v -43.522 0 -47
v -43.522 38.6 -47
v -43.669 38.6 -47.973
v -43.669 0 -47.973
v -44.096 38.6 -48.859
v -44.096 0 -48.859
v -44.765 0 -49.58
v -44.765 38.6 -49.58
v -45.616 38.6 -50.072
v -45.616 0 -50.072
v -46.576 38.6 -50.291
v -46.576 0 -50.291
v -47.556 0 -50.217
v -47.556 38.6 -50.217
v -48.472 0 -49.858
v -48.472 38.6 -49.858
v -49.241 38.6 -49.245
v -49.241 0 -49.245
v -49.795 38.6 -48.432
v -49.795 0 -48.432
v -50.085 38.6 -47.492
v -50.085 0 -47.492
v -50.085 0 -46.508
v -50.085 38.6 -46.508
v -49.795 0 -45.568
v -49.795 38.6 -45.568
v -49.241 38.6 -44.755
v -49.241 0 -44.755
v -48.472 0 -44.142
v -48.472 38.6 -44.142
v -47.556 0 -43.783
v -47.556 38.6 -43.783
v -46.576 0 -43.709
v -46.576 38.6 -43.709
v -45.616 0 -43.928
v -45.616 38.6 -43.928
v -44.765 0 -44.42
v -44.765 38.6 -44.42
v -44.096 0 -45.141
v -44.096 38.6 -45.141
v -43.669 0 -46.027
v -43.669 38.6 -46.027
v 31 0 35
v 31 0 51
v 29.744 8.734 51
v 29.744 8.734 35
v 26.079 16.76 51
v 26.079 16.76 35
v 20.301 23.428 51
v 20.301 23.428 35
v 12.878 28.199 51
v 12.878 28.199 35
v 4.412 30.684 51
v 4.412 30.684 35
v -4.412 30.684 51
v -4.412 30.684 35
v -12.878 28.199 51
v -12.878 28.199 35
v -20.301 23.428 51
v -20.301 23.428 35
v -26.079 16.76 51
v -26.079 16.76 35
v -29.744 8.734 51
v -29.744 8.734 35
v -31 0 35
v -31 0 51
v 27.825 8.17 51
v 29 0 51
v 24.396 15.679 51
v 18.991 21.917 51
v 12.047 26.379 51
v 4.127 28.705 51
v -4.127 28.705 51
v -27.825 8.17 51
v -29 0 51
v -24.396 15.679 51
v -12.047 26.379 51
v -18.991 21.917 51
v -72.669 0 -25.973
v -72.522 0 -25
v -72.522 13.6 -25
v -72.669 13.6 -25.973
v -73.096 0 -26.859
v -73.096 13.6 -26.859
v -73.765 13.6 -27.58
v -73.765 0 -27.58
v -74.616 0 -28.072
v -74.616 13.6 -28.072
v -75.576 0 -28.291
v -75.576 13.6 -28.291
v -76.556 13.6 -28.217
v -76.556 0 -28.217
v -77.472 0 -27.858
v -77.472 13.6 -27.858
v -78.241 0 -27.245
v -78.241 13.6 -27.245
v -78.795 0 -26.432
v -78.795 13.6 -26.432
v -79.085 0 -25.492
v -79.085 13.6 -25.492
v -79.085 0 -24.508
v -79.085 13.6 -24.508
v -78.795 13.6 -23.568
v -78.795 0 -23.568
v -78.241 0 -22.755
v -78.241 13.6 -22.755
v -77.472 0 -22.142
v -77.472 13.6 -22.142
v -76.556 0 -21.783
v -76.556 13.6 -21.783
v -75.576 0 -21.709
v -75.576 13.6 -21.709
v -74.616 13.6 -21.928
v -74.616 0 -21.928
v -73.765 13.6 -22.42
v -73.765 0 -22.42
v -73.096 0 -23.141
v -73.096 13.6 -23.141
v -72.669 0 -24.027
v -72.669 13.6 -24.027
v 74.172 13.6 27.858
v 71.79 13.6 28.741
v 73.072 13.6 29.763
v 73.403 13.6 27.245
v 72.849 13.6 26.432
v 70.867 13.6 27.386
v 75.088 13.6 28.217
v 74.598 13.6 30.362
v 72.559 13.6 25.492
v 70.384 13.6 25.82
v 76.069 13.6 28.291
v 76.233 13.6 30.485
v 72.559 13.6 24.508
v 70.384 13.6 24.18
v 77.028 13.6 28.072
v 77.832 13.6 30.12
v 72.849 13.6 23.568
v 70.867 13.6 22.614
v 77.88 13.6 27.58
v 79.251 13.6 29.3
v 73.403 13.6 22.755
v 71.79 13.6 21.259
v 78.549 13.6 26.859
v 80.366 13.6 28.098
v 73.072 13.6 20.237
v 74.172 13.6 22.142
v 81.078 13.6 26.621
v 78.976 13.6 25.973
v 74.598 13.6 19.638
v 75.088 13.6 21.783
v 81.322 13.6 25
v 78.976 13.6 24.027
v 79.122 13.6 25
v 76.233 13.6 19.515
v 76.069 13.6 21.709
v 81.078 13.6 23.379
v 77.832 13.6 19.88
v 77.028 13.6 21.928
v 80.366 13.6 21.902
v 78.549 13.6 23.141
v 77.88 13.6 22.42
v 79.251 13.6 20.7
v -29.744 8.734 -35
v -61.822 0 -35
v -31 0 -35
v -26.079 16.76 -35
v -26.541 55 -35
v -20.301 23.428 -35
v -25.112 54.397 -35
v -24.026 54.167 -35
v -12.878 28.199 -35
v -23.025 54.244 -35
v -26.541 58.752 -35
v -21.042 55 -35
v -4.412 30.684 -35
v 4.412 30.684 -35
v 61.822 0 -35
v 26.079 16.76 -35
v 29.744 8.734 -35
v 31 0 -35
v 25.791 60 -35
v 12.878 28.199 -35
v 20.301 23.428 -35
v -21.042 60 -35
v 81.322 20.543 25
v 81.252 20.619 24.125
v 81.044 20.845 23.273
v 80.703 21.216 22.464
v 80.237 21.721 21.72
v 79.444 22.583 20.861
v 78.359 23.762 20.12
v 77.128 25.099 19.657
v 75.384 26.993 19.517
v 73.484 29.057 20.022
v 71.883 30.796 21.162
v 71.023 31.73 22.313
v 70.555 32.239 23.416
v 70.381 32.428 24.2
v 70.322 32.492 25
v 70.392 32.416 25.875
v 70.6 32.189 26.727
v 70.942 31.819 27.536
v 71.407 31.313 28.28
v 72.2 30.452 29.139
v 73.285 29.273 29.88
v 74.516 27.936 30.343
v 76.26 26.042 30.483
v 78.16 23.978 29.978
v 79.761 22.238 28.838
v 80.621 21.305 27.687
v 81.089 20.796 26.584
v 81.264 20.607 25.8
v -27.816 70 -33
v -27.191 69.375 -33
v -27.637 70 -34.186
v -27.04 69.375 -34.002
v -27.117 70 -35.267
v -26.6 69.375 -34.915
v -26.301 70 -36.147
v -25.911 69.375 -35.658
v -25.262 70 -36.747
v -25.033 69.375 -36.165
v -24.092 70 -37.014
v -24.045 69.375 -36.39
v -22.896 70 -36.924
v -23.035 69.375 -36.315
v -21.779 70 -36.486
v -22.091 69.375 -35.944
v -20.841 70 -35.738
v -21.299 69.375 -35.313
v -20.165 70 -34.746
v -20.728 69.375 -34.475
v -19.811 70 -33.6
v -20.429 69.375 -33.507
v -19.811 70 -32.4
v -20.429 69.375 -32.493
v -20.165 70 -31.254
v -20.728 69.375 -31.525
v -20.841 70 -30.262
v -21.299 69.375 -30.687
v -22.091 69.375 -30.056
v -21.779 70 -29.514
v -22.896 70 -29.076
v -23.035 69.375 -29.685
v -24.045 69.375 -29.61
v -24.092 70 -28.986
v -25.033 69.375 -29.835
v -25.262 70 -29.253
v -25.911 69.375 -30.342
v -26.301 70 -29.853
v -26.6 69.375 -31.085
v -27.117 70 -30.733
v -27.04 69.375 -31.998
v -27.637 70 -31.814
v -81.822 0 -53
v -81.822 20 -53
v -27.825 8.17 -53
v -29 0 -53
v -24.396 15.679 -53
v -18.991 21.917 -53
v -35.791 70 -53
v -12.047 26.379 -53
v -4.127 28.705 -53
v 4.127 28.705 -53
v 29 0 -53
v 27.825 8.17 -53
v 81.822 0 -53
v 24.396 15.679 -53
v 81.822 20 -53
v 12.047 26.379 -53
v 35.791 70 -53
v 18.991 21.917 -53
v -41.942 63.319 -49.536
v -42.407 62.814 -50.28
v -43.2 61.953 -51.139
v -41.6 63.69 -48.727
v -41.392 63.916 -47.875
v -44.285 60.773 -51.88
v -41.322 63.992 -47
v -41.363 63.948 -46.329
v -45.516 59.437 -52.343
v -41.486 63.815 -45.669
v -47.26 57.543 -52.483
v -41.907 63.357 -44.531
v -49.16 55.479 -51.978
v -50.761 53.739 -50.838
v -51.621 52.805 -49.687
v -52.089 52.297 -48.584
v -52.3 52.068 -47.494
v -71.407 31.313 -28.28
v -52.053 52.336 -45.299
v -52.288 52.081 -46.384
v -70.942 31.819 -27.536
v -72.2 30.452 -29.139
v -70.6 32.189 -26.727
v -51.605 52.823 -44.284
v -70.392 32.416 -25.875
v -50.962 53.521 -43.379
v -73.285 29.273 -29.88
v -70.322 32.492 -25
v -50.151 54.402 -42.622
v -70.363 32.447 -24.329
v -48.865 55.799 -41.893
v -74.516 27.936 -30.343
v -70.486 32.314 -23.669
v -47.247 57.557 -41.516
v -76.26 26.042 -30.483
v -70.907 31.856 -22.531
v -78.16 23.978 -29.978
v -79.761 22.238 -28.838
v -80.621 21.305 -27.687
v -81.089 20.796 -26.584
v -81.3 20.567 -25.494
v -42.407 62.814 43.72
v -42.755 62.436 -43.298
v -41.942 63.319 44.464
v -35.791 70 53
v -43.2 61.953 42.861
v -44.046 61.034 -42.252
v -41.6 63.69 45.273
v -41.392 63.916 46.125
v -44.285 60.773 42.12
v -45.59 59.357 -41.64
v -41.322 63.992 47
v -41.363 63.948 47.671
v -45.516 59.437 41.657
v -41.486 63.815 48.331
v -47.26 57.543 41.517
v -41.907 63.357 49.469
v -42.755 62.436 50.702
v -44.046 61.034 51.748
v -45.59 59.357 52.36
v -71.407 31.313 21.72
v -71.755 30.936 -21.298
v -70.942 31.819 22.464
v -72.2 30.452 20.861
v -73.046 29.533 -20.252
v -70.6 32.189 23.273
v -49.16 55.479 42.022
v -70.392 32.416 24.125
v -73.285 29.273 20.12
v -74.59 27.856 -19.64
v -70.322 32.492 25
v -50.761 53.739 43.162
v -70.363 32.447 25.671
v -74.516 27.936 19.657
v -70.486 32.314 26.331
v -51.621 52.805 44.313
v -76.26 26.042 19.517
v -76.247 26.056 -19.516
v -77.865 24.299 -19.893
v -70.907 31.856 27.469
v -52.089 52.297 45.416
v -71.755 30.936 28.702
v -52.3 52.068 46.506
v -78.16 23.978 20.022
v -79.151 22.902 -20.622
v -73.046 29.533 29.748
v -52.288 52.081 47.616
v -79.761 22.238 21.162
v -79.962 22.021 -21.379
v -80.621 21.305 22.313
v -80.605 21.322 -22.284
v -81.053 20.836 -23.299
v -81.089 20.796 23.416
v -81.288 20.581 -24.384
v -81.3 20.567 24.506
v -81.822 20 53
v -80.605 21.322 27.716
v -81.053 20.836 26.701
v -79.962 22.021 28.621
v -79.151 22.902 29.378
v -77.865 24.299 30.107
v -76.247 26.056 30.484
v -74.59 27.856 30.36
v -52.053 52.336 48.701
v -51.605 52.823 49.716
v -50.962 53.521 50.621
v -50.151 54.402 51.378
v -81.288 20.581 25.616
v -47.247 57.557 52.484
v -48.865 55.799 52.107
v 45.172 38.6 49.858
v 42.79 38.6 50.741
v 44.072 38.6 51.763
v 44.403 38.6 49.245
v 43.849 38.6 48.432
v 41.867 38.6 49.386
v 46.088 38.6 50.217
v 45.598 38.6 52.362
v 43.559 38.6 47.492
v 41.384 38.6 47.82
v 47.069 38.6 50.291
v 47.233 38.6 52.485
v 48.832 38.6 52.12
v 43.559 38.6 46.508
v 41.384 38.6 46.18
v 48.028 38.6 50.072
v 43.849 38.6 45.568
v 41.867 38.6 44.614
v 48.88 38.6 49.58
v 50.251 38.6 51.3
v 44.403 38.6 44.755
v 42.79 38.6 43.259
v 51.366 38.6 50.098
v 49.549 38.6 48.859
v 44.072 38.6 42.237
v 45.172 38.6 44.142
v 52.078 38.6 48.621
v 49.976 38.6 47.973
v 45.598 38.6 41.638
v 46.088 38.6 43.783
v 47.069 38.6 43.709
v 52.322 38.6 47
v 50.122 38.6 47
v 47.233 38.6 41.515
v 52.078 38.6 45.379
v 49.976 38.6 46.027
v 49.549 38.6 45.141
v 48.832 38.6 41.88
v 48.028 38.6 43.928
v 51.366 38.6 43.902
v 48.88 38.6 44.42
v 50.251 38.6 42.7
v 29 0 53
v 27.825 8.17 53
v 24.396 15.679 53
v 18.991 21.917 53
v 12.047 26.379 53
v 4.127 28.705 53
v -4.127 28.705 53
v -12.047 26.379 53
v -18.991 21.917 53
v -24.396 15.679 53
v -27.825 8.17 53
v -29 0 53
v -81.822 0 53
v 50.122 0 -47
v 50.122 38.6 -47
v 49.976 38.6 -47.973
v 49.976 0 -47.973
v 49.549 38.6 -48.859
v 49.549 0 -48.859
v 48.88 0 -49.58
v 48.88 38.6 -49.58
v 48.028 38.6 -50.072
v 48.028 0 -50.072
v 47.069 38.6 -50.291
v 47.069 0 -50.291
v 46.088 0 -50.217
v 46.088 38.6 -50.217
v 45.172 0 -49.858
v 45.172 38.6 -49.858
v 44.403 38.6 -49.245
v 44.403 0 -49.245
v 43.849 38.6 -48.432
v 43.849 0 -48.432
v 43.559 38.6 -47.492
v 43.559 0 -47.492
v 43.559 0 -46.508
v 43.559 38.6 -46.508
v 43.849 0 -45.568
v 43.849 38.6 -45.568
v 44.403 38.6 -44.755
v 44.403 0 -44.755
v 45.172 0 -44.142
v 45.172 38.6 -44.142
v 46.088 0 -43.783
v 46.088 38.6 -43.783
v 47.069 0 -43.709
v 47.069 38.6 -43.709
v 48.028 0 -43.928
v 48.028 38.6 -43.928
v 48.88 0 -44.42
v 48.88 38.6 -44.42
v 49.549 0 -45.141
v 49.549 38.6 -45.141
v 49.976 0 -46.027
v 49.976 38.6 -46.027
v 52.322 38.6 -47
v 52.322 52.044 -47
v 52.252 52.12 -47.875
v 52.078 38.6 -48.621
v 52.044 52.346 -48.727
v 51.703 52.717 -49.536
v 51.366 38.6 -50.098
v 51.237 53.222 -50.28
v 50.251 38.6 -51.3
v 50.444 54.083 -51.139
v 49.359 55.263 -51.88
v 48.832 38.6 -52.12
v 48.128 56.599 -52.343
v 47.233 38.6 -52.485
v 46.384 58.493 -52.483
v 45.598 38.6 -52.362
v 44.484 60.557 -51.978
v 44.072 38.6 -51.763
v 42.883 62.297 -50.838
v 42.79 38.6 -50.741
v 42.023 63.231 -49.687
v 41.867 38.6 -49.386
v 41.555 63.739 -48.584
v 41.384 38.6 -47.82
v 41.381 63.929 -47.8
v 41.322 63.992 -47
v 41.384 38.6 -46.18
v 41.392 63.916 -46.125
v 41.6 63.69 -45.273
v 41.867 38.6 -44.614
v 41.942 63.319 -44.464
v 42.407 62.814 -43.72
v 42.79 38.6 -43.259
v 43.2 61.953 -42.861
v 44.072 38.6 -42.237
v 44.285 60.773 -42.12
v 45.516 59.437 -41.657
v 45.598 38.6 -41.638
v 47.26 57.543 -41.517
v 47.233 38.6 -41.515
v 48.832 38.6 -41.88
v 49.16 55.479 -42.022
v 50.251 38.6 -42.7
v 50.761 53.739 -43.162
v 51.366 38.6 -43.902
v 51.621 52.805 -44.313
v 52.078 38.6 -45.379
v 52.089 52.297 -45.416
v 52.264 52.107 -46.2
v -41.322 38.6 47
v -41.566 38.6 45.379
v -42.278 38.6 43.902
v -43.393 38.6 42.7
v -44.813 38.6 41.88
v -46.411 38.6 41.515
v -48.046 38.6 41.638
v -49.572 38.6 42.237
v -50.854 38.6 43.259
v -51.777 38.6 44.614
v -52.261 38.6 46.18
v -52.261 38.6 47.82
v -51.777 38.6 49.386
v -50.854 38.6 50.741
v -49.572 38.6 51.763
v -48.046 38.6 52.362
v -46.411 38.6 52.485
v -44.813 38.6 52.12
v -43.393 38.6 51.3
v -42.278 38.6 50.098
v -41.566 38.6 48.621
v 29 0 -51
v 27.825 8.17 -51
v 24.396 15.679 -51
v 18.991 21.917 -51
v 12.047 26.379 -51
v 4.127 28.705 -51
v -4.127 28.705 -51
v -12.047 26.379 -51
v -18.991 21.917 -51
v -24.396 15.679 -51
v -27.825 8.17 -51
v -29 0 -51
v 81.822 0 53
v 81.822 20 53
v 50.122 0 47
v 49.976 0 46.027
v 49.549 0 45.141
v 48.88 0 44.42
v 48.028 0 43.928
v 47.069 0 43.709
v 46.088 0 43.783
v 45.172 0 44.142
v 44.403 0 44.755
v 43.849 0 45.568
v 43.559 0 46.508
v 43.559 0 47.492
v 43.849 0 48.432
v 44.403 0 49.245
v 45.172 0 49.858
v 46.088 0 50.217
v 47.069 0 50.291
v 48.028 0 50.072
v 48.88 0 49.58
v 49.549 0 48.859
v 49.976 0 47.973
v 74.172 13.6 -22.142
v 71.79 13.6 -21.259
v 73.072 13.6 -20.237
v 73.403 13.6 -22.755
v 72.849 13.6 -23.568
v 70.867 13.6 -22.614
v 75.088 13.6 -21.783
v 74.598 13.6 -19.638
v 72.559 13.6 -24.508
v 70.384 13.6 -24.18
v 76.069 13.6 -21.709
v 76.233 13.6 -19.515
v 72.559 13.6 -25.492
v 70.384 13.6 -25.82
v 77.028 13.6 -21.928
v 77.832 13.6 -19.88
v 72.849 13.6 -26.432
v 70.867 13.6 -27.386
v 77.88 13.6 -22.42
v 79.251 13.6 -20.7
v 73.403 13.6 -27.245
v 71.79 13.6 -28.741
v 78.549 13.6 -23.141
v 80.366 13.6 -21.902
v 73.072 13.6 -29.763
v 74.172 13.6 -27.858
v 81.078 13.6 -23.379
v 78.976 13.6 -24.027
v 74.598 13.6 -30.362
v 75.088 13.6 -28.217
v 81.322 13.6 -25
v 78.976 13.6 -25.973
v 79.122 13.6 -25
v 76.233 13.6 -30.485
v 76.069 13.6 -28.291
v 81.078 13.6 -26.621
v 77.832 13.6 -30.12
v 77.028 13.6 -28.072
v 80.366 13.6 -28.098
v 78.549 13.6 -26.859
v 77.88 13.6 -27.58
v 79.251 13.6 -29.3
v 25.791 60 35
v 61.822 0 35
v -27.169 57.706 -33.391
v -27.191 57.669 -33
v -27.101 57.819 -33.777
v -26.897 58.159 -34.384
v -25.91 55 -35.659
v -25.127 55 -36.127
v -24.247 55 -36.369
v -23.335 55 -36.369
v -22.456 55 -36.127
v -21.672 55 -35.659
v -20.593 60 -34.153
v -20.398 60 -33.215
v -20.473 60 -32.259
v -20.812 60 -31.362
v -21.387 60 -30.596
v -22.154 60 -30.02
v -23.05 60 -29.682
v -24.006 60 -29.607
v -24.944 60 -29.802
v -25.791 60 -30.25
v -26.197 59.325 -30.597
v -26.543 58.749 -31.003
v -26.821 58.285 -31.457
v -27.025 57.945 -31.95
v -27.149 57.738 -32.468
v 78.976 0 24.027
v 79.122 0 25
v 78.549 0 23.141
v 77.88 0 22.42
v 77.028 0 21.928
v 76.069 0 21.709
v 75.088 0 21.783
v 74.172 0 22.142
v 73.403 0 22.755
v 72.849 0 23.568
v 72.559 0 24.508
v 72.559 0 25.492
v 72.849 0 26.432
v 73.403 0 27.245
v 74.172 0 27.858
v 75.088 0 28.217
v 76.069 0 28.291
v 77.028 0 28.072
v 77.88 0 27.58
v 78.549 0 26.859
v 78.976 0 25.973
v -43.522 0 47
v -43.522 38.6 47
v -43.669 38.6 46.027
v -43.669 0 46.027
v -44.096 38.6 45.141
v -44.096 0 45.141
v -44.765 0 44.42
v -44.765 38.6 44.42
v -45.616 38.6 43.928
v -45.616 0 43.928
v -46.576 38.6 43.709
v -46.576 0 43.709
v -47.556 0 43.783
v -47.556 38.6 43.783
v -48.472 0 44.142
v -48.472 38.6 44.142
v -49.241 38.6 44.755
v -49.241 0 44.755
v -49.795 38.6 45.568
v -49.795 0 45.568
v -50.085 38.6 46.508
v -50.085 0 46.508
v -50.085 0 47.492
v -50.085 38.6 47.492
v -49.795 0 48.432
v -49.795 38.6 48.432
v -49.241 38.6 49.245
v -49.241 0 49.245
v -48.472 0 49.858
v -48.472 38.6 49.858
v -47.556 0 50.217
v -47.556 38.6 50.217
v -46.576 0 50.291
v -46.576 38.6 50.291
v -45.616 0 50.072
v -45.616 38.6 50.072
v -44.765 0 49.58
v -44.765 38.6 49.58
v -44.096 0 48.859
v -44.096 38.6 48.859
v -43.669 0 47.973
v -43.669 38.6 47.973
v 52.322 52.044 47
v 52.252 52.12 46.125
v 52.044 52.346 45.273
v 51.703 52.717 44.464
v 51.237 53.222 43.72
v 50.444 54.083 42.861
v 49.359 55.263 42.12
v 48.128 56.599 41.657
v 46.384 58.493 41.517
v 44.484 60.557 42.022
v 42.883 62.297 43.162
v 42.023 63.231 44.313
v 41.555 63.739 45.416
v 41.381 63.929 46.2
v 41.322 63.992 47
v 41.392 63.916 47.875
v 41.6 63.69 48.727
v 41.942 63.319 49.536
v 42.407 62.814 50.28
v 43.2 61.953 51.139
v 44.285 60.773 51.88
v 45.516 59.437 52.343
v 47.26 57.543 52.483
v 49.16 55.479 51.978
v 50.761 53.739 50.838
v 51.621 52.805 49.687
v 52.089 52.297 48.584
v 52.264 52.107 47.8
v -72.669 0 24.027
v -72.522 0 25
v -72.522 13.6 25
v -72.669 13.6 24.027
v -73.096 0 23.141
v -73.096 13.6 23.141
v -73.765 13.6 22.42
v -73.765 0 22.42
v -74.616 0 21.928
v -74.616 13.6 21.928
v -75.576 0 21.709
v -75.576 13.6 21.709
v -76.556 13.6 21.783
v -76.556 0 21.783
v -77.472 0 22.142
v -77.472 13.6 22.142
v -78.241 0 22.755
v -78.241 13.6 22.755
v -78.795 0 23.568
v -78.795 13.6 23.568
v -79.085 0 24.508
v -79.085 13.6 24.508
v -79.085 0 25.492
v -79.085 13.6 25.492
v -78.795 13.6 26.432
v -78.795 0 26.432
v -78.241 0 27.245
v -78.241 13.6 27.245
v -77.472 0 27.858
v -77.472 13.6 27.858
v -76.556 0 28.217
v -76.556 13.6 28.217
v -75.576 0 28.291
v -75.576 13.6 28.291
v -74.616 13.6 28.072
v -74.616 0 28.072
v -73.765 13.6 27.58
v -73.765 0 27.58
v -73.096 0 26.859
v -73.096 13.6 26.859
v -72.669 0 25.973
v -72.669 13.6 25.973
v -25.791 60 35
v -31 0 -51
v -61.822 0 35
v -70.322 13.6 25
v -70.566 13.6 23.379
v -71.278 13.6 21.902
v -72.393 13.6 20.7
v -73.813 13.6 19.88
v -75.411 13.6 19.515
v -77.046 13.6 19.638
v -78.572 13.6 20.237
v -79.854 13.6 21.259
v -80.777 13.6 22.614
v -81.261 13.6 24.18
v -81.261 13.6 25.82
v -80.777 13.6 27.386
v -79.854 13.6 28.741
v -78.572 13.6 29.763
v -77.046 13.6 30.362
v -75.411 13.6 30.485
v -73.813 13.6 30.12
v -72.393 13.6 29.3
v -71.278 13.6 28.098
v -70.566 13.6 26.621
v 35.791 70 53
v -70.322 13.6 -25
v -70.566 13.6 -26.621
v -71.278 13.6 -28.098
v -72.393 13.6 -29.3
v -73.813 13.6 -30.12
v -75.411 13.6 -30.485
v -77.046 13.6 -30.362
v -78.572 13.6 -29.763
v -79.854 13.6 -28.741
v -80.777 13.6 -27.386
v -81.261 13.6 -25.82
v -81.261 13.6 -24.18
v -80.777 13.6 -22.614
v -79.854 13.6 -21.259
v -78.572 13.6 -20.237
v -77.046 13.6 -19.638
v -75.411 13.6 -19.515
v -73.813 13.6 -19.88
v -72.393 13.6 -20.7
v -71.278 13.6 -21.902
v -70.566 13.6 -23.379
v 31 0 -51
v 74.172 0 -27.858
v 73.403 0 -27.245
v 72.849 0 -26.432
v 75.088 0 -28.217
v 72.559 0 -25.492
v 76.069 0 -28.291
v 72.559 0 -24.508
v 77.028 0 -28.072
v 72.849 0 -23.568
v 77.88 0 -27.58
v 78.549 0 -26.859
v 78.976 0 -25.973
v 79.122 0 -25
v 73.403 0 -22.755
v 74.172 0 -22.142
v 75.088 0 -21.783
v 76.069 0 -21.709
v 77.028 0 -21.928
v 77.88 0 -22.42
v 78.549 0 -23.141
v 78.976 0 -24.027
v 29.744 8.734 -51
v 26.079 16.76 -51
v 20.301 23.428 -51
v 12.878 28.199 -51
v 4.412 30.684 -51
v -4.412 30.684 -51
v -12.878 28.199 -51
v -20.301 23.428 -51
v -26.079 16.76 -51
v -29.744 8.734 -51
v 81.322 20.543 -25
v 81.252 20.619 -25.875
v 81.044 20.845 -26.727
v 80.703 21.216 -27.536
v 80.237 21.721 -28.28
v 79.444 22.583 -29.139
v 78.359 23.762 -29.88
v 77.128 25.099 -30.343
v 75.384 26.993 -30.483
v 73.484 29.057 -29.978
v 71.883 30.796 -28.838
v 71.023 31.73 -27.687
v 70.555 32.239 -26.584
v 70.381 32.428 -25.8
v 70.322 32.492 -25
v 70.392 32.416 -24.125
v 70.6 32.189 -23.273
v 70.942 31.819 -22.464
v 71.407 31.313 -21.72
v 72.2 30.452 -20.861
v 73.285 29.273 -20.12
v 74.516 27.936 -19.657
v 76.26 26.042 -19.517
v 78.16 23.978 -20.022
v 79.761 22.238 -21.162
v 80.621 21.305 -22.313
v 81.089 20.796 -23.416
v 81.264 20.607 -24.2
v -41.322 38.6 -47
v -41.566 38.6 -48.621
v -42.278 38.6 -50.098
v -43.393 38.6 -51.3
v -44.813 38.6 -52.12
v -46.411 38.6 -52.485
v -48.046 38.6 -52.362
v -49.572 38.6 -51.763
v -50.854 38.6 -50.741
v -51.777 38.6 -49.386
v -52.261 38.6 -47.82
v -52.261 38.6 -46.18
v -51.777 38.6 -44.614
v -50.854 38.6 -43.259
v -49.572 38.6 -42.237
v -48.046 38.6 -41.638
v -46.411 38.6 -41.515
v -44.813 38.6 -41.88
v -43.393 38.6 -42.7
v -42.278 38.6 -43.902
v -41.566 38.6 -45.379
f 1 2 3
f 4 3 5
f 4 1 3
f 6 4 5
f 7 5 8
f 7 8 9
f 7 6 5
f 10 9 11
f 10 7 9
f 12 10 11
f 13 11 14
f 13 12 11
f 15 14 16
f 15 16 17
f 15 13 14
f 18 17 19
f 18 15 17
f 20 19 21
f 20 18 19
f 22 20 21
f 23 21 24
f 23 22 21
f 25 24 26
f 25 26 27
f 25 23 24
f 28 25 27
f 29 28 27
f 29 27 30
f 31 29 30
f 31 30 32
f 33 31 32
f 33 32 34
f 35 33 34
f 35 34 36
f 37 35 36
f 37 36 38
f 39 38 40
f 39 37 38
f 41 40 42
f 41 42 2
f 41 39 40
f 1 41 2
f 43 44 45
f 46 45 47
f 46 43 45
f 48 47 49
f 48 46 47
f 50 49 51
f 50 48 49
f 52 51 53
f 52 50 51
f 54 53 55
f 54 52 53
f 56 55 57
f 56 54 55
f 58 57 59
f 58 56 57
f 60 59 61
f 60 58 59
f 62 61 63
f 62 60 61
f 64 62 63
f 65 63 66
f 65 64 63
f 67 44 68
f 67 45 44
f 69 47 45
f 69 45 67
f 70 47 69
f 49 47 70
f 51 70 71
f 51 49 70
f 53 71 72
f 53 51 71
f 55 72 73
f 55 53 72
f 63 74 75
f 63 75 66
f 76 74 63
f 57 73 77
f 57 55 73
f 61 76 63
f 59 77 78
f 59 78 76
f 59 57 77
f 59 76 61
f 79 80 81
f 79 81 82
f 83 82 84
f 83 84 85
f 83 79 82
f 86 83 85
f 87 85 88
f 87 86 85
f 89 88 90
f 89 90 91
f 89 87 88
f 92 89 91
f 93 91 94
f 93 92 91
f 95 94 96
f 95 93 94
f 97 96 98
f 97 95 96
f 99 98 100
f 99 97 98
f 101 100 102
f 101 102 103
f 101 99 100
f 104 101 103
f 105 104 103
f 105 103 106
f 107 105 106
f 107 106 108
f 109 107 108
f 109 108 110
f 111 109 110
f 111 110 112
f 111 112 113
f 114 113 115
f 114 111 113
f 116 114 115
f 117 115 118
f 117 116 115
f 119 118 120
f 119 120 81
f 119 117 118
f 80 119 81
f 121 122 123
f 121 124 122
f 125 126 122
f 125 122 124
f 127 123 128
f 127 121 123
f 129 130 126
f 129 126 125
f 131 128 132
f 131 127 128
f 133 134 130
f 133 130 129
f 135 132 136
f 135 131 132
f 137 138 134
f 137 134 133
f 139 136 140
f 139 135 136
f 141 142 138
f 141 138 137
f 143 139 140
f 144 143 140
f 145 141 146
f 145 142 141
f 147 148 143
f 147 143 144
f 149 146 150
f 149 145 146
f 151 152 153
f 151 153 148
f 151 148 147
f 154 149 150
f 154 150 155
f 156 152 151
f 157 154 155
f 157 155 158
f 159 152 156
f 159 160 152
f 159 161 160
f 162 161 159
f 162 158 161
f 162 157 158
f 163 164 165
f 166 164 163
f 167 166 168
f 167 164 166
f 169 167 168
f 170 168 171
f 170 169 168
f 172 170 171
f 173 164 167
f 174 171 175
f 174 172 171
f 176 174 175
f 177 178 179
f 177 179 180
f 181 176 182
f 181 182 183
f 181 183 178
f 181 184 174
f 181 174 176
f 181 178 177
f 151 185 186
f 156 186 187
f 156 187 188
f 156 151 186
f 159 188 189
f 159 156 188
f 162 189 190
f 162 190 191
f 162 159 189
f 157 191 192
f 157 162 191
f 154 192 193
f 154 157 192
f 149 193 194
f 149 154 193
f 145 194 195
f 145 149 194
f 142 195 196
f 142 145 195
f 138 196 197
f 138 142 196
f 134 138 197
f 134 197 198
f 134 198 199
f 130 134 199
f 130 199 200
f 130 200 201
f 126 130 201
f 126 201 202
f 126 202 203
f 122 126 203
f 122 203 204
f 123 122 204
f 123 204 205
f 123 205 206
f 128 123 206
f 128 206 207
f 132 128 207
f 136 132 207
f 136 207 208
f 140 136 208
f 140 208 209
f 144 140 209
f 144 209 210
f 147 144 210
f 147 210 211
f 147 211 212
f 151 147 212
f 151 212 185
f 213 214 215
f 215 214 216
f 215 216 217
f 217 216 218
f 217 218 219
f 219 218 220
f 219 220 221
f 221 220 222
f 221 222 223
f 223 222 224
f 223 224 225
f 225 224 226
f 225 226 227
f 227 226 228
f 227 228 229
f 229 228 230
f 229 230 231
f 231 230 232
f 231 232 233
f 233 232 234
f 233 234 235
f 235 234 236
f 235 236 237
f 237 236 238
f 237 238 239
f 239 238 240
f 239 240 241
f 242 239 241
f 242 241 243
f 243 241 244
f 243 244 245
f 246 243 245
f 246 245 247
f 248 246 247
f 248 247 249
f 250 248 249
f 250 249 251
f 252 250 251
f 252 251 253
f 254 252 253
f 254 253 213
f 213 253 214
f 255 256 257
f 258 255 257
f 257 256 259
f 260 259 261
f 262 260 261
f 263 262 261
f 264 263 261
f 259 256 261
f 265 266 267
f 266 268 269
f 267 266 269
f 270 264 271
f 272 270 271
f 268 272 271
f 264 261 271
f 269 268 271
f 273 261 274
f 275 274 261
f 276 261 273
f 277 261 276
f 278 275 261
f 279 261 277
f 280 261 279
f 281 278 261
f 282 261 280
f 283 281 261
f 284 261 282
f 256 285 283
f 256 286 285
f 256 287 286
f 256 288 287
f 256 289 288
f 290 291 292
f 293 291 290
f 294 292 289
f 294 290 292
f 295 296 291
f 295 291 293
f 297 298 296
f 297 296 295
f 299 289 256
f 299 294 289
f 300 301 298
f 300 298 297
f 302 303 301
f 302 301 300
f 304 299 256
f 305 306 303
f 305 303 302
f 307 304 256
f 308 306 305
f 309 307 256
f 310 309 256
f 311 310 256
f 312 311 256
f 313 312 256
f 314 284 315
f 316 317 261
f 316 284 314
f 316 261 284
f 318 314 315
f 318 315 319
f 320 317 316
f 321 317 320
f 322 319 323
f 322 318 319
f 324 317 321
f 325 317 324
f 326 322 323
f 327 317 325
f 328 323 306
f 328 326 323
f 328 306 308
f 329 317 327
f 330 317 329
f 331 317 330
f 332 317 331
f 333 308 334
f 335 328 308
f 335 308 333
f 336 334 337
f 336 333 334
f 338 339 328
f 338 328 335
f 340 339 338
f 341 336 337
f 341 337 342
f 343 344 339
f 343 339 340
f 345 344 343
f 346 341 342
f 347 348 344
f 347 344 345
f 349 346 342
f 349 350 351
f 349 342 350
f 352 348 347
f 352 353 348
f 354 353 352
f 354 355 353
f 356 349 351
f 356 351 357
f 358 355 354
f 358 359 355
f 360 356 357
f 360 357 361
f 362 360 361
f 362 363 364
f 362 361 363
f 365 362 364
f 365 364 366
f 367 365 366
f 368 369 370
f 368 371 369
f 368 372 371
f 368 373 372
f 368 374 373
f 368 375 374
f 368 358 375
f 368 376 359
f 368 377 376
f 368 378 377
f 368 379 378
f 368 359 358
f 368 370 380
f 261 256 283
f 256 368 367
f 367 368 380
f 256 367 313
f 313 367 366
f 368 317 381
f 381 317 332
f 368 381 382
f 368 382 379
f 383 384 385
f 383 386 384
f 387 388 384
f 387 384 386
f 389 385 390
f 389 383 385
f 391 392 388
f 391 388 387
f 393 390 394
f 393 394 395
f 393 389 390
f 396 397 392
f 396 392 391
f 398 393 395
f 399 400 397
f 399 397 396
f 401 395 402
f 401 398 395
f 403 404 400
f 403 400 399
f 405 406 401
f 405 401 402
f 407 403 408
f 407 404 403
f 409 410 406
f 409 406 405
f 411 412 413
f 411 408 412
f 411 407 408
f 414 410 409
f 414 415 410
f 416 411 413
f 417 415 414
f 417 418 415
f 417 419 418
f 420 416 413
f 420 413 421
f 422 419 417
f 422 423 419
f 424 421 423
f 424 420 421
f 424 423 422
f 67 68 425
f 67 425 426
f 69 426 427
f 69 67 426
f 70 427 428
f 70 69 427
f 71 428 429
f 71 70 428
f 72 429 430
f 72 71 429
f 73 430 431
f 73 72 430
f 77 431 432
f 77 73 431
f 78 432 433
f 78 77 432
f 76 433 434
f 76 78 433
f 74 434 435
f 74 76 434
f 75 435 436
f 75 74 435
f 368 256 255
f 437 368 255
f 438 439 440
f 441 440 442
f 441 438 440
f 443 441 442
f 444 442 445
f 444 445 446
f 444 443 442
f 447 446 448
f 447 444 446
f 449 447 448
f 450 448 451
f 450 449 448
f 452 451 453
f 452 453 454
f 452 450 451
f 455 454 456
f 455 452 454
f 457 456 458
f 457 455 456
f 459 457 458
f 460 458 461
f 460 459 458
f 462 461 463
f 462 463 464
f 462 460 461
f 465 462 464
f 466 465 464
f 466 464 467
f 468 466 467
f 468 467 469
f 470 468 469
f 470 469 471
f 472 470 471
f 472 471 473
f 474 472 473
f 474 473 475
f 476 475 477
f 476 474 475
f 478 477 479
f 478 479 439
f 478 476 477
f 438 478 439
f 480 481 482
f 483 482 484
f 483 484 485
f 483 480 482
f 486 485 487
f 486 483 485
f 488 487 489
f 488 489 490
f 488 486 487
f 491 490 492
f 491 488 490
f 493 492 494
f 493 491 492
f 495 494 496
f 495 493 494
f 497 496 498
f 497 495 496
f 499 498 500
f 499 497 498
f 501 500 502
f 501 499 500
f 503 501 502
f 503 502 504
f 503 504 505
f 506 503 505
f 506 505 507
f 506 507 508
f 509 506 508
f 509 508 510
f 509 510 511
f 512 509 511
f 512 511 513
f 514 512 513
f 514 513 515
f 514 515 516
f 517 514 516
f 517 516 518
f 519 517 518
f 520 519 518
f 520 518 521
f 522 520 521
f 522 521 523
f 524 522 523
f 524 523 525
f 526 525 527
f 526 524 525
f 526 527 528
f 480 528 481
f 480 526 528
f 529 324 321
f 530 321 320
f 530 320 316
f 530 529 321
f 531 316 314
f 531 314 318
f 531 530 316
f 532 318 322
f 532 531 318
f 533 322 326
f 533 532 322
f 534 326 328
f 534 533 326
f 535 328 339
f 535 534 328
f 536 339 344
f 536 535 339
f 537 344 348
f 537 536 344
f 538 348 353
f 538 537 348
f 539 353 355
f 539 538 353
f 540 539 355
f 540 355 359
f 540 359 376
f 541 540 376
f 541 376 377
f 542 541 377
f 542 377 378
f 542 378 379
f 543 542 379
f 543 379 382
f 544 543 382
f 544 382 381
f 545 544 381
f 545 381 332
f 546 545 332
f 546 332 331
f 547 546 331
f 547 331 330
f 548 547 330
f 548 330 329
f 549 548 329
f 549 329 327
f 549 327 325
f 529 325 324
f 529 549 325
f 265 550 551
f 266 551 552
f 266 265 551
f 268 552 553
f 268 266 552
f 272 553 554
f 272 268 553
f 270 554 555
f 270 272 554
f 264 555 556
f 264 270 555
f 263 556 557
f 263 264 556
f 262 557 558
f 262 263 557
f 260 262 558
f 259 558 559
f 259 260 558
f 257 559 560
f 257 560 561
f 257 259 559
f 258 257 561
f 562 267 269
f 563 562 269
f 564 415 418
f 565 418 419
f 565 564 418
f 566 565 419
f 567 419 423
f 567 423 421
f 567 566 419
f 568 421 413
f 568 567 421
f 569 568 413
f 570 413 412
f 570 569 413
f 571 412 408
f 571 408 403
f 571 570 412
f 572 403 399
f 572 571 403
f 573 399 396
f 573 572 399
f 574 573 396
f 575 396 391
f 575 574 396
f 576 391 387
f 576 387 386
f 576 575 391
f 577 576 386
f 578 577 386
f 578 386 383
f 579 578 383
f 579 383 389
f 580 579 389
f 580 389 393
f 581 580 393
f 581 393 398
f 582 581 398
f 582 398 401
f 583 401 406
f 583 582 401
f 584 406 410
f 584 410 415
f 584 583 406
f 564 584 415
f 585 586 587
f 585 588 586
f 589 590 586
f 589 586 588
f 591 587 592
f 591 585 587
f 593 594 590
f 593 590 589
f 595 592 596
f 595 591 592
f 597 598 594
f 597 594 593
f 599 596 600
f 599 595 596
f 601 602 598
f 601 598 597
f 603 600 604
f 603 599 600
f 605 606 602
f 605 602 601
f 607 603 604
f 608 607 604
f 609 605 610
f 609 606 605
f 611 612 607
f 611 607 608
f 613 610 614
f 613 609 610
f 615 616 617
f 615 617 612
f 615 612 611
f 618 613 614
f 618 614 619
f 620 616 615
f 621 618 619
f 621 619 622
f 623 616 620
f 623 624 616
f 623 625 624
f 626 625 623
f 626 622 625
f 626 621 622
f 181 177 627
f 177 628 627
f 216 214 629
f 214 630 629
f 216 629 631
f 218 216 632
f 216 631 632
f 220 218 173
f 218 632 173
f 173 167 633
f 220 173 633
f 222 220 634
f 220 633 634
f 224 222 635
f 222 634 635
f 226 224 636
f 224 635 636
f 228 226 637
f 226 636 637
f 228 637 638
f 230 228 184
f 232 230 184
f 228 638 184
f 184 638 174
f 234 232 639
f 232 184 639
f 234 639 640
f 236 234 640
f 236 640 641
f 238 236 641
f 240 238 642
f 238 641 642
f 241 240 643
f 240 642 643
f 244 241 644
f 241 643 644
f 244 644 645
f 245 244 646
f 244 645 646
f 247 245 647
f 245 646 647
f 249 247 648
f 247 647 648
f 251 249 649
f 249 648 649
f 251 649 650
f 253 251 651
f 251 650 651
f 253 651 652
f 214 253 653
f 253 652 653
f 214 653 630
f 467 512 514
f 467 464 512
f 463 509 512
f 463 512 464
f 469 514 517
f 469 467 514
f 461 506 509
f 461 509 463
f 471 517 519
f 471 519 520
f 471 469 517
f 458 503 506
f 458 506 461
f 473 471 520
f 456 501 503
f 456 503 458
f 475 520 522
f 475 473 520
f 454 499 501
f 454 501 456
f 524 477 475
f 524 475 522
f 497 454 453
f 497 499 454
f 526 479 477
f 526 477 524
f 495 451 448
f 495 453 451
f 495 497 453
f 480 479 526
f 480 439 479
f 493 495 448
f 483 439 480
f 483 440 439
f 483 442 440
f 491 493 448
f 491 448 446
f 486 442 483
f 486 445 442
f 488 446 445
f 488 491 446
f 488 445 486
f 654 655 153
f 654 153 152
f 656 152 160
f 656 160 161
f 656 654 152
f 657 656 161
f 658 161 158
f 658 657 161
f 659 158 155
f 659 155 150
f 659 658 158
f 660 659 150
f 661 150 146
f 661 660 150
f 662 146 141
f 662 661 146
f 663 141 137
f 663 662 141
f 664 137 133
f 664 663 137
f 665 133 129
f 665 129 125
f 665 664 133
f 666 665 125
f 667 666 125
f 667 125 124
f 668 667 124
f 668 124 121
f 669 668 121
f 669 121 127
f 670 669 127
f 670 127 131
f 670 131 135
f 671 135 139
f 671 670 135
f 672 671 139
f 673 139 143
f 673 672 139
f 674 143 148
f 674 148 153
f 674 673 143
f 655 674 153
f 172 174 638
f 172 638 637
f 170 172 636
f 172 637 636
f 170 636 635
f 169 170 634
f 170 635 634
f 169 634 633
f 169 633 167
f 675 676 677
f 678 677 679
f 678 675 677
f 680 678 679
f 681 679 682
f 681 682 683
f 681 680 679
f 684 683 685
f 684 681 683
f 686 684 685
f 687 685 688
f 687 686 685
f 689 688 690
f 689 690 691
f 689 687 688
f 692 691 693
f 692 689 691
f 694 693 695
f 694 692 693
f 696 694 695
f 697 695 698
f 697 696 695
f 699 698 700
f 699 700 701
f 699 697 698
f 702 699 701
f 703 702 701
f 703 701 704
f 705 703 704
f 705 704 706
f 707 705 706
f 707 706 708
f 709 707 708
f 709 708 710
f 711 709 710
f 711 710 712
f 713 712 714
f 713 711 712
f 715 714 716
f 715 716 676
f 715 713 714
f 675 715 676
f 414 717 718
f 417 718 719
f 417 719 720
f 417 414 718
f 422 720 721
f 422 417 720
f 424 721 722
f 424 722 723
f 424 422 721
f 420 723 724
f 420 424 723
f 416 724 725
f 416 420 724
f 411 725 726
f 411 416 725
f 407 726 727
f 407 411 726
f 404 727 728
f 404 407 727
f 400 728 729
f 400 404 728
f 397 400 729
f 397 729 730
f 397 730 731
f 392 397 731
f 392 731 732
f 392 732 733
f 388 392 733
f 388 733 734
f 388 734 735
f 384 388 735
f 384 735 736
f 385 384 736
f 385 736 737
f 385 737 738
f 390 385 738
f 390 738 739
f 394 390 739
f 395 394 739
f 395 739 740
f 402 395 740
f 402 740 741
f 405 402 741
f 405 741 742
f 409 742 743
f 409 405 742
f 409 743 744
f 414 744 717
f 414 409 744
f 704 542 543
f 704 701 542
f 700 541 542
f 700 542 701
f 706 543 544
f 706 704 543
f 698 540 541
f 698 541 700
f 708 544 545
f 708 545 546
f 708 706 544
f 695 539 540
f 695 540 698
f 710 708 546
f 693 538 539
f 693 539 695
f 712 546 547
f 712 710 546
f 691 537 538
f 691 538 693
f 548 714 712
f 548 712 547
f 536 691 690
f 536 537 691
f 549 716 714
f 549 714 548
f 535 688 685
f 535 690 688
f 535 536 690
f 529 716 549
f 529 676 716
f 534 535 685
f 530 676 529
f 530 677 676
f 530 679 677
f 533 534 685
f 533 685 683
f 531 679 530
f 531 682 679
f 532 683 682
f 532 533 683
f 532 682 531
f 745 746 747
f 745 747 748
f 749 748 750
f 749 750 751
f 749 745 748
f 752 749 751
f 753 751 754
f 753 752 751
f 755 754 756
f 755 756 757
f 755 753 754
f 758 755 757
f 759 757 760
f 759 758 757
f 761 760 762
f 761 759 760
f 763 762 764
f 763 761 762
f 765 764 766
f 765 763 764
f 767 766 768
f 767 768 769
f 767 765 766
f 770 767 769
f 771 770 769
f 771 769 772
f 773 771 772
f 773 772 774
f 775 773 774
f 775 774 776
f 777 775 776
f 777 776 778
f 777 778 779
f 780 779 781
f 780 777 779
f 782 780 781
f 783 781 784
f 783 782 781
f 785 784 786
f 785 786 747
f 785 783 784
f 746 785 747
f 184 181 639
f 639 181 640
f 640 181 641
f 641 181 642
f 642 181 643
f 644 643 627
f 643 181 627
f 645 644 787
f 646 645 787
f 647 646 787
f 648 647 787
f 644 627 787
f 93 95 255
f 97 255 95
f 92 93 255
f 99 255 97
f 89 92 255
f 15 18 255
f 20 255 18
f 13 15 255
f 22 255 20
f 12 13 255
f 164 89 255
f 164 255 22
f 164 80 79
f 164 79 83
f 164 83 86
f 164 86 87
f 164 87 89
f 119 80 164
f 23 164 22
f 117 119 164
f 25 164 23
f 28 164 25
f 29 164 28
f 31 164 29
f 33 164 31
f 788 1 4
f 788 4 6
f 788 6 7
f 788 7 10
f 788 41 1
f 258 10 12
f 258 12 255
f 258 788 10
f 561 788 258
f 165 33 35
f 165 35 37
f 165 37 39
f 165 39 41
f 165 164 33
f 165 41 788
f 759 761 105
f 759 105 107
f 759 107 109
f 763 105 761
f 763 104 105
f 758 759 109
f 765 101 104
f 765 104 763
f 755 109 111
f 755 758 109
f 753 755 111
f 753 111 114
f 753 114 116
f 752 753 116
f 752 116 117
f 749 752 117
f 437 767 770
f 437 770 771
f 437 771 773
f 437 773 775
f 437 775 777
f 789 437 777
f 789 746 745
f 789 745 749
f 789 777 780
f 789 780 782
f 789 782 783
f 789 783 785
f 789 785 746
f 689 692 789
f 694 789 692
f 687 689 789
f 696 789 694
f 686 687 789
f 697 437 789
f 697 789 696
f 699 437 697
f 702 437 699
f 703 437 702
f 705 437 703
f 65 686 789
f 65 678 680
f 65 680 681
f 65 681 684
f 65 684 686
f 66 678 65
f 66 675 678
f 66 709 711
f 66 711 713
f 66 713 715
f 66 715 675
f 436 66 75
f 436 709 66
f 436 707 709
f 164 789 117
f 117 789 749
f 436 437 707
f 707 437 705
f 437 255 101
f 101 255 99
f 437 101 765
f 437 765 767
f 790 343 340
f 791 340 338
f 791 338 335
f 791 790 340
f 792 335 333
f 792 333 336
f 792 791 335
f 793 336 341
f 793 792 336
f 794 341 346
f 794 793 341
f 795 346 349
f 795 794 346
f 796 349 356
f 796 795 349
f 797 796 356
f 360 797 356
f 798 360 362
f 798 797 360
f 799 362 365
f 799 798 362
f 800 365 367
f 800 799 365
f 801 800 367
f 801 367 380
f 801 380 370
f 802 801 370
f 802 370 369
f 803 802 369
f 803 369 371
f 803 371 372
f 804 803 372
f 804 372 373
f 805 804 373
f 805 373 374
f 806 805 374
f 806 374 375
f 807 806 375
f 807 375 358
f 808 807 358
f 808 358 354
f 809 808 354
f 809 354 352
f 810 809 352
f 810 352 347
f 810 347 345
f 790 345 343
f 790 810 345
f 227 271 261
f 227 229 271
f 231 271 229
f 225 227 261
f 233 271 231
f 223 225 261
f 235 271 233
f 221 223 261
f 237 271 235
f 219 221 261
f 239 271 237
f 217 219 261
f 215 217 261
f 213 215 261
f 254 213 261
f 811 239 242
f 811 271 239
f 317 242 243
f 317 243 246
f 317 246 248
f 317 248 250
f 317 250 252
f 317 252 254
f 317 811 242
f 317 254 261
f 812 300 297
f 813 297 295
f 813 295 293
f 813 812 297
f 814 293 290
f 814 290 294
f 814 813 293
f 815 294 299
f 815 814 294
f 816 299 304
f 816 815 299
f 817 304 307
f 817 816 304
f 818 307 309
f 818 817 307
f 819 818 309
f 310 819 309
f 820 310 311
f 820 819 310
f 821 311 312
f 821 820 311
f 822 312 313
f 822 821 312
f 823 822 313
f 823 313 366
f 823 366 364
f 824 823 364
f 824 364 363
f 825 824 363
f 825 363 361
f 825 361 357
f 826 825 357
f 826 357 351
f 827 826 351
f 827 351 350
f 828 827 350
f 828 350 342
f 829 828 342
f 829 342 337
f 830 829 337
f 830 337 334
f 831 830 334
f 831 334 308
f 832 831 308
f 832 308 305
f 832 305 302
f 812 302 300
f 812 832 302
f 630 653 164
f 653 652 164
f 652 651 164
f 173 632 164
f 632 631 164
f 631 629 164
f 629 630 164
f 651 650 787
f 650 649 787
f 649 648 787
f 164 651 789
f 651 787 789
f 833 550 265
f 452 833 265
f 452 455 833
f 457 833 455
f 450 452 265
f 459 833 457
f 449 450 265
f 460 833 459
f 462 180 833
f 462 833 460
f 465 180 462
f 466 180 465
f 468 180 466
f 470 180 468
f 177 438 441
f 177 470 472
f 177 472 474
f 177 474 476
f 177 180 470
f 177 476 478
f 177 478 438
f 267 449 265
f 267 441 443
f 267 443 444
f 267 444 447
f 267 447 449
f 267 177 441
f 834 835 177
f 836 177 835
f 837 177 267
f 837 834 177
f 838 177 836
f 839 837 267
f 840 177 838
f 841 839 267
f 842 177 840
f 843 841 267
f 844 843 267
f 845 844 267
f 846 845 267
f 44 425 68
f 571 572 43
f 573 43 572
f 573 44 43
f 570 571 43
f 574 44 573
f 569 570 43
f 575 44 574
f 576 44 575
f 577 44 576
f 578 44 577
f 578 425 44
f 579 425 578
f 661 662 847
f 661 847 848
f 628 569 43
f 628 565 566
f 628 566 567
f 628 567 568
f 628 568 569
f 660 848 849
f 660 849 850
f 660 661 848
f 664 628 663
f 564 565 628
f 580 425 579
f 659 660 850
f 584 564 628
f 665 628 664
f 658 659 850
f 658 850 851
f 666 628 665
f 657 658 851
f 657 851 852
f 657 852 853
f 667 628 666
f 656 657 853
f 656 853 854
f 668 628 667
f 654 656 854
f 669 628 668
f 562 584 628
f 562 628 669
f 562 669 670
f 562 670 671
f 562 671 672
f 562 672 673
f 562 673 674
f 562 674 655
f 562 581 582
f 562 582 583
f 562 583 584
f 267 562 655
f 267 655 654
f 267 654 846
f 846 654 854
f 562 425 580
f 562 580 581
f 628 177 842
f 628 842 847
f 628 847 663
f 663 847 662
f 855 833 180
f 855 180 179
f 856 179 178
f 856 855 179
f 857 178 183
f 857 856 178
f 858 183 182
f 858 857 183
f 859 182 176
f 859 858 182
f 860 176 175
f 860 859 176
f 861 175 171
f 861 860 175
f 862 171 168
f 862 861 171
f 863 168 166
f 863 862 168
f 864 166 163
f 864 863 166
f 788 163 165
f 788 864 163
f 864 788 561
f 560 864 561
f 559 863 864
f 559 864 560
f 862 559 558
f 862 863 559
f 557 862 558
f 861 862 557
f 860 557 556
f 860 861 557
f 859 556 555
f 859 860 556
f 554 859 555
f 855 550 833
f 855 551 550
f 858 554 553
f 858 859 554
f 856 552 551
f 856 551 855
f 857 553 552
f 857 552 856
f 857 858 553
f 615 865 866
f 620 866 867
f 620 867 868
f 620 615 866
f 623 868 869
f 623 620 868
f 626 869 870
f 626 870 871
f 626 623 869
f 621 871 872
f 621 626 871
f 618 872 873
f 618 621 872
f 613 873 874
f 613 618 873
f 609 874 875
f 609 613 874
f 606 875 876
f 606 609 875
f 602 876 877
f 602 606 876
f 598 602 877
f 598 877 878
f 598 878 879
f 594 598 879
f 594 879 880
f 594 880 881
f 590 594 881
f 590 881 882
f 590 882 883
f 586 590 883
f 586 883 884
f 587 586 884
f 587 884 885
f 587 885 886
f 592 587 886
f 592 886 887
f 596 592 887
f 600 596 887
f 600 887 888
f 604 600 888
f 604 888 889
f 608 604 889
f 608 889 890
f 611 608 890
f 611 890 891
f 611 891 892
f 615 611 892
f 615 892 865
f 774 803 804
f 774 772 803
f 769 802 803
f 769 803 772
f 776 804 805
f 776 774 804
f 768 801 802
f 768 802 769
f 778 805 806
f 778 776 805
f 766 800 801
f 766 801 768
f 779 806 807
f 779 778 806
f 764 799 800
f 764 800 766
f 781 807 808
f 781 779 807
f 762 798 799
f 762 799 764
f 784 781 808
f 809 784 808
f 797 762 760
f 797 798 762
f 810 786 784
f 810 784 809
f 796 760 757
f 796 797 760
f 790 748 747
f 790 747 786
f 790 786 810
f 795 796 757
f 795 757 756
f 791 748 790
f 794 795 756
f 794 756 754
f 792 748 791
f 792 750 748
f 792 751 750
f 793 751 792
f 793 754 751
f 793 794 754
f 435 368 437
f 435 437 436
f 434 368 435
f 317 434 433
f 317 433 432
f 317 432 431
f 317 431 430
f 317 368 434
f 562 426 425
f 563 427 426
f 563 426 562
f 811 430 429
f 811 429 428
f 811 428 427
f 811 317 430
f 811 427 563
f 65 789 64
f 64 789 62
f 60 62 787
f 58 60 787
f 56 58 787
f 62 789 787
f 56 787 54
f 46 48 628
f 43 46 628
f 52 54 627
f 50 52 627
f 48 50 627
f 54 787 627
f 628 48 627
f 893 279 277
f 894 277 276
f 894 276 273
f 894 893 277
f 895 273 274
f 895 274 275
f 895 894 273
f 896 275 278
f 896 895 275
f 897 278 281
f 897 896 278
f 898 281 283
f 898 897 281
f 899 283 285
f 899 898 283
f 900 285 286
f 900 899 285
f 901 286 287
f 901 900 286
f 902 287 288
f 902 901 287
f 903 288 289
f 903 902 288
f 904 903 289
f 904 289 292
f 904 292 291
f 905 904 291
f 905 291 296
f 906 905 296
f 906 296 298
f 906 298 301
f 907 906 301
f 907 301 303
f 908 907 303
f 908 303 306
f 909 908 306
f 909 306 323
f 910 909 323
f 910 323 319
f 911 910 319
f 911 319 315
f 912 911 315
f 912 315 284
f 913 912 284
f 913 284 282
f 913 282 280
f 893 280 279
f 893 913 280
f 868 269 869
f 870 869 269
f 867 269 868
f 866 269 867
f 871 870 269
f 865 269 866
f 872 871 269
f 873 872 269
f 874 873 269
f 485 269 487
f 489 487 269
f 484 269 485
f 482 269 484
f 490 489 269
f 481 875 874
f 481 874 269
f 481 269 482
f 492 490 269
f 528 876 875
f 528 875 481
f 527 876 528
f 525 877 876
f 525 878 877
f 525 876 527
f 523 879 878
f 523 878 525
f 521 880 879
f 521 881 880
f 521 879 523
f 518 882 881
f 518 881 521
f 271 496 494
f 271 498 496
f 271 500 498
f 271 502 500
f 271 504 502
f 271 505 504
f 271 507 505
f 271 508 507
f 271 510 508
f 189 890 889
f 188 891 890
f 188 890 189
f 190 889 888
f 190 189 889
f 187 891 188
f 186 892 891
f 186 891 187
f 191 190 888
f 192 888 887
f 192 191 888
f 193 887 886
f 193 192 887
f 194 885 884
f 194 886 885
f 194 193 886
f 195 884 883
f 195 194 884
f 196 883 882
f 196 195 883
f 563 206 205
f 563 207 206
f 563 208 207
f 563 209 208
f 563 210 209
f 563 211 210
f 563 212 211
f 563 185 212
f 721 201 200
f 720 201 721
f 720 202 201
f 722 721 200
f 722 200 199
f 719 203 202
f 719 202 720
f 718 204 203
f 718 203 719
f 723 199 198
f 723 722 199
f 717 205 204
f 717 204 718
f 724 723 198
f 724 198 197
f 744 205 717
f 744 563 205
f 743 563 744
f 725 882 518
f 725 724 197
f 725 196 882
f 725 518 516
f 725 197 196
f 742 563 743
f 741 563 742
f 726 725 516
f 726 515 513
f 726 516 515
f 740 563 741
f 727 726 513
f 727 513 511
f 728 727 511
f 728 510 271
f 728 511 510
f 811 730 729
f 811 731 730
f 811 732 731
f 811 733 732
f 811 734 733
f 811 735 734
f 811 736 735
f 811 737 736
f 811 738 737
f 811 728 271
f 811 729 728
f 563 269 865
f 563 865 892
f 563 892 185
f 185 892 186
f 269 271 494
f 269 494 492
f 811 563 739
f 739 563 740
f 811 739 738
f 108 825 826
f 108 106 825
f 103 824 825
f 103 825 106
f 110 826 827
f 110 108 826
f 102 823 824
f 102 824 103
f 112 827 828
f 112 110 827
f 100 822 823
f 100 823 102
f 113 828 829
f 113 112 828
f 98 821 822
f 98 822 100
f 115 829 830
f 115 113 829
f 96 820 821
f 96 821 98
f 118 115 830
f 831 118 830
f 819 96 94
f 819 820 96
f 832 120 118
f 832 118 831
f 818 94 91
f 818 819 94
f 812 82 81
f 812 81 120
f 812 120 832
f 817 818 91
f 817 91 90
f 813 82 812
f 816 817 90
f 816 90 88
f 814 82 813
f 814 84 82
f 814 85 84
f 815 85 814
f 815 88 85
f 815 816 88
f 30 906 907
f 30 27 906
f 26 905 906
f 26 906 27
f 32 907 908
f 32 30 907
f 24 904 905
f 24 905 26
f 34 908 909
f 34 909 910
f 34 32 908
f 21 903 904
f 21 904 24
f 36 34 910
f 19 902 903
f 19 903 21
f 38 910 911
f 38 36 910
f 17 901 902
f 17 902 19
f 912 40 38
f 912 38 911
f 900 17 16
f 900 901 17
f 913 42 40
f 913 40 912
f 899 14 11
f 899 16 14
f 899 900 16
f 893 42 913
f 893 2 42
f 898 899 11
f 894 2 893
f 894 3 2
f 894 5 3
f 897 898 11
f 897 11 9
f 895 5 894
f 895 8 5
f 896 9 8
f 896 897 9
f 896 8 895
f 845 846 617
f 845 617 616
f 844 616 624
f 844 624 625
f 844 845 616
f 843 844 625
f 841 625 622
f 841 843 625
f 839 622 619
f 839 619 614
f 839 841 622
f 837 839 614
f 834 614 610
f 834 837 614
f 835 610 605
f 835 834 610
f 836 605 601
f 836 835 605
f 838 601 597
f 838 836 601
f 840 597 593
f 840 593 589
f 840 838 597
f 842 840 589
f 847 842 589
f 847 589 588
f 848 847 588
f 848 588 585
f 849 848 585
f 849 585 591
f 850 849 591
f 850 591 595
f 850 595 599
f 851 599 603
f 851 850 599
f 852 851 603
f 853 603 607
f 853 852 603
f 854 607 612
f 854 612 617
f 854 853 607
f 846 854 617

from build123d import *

# Parameters (mm, degrees)
P_IDAT_VYSUNUT_M1_DEPTH                     = 53
ODEBRAT_VYSUNUT_M1_DEPTH                    = 35
V_LCOV_START                                = 38.6
V_LCOV_ZAHLOUBEN_PRO_M6_ROUBY_S_V_2_R       = 5.5
V_LCOV_ZAHLOUBEN_PRO_M6_ROUBY_S_VNIT_DEPTH  = 25.392214676
V_LCOV_ZAHLOUBEN_PRO_M6_ROUBY_S_V_3_O_R     = 3.3
V_LCOV_ZAHLOUBEN_PRO_M6_ROUBY_S_V_3_DEPTH   = 38.6
V_LCOV_START_2                              = 13.6
V_LCOV_ZAHLOUBEN_PRO_M6_ROUBY_S_V_4_O_R     = 5.5
V_LCOV_ZAHLOUBEN_PRO_M6_ROUBY_S_V_4_DEPTH   = 18.891616585
V_LCOV_ZAHLOUBEN_PRO_M6_ROUBY_S_V_5_R       = 3.3
V_LCOV_ZAHLOUBEN_PRO_M6_ROUBY_S_V_4_2_DEPTH = 13.6
M8_Z_VIT1_D                                 = 6.8
M8_Z_VIT1_DEPTH                             = 15
M8_Z_VIT1_CSINK_D                           = 8.05
M8_Z_VIT1_CSINK_ANGLE                       = 90
M8_Z_VIT1_TIP                               = 2.042926105


# Read off the part's stored shape, not the designer's step: Válcové zahloubení pro M6 šrouby s vnitřním šestihranem1, Válcové zahloubení pro M6 šrouby s vnitřním šestihranem2
with BuildPart() as part:
    # Skica1 → Přidat vysunutím1 (new, symmetric)
    with BuildSketch(Plane.XY):
        Polygon((61.822124963, 0), (25.791252921, 60), (-25.791252921, 60), (-61.822124963, 0), align=None)
        Polygon((-25.791252921, 60), (25.791252921, 60), (61.822124963, 0), (81.822124963, 0), (81.822124963, 20), (35.791252921, 70), (-35.791252921, 70), (-81.822124963, 20), (-81.822124963, 0), (-61.822124963, 0), align=None)
    extrude(amount=P_IDAT_VYSUNUT_M1_DEPTH, both=True)

    # Skica1<3> → Odebrat vysunutím1 (cut, symmetric)
    with BuildSketch(Plane.XY):
        Polygon((61.822124963, 0), (25.791252921, 60), (-25.791252921, 60), (-61.822124963, 0), align=None)
    extrude(amount=ODEBRAT_VYSUNUT_M1_DEPTH, both=True, mode=Mode.SUBTRACT)

    # V_lcov_ zahlouben_ pro M6 _rouby s v 2 → V_lcov_ zahlouben_ pro M6 _rouby s vnit (cut)
    with BuildSketch(Plane(origin=(0, 0, 0), x_dir=(1, 0, 0), z_dir=(0, 1, 0)).offset(V_LCOV_START)):
        with Locations((46.822124963, 47)):
            Circle(V_LCOV_ZAHLOUBEN_PRO_M6_ROUBY_S_V_2_R)
        with Locations((-46.822124963, -47)):
            Circle(V_LCOV_ZAHLOUBEN_PRO_M6_ROUBY_S_V_2_R)
        with Locations((46.822124963, -47)):
            Circle(V_LCOV_ZAHLOUBEN_PRO_M6_ROUBY_S_V_2_R)
        with Locations((-46.822124963, 47)):
            Circle(V_LCOV_ZAHLOUBEN_PRO_M6_ROUBY_S_V_2_R)
    extrude(amount=V_LCOV_ZAHLOUBEN_PRO_M6_ROUBY_S_VNIT_DEPTH, mode=Mode.SUBTRACT)

    # V_lcov_ zahlouben_ pro M6 _rouby s v 3 o → V_lcov_ zahlouben_ pro M6 _rouby s v 3 (cut)
    with BuildSketch(Plane(origin=(0, 0, 0), x_dir=(1, 0, 0), z_dir=(0, 1, 0))):
        with Locations((46.822124963, 47)):
            Circle(V_LCOV_ZAHLOUBEN_PRO_M6_ROUBY_S_V_3_O_R)
        with Locations((-46.822124963, -47)):
            Circle(V_LCOV_ZAHLOUBEN_PRO_M6_ROUBY_S_V_3_O_R)
        with Locations((46.822124963, -47)):
            Circle(V_LCOV_ZAHLOUBEN_PRO_M6_ROUBY_S_V_3_O_R)
        with Locations((-46.822124963, 47)):
            Circle(V_LCOV_ZAHLOUBEN_PRO_M6_ROUBY_S_V_3_O_R)
    extrude(amount=V_LCOV_ZAHLOUBEN_PRO_M6_ROUBY_S_V_3_DEPTH, mode=Mode.SUBTRACT)

    # V_lcov_ zahlouben_ pro M6 _rouby s v 4 o → V_lcov_ zahlouben_ pro M6 _rouby s v 4 (cut)
    with BuildSketch(Plane(origin=(0, 0, 0), x_dir=(1, 0, 0), z_dir=(0, 1, 0)).offset(V_LCOV_START_2)):
        with Locations((75.822124963, 25)):
            Circle(V_LCOV_ZAHLOUBEN_PRO_M6_ROUBY_S_V_4_O_R)
        with Locations((-75.822124963, -25)):
            Circle(V_LCOV_ZAHLOUBEN_PRO_M6_ROUBY_S_V_4_O_R)
        with Locations((75.822124963, -25)):
            Circle(V_LCOV_ZAHLOUBEN_PRO_M6_ROUBY_S_V_4_O_R)
        with Locations((-75.822124963, 25)):
            Circle(V_LCOV_ZAHLOUBEN_PRO_M6_ROUBY_S_V_4_O_R)
    extrude(amount=V_LCOV_ZAHLOUBEN_PRO_M6_ROUBY_S_V_4_DEPTH, mode=Mode.SUBTRACT)

    # V_lcov_ zahlouben_ pro M6 _rouby s v 5 → V_lcov_ zahlouben_ pro M6 _rouby s v 4 2 (cut)
    with BuildSketch(Plane(origin=(0, 0, 0), x_dir=(1, 0, 0), z_dir=(0, 1, 0))):
        with Locations((75.822124963, 25)):
            Circle(V_LCOV_ZAHLOUBEN_PRO_M6_ROUBY_S_V_5_R)
        with Locations((-75.822124963, -25)):
            Circle(V_LCOV_ZAHLOUBEN_PRO_M6_ROUBY_S_V_5_R)
        with Locations((75.822124963, -25)):
            Circle(V_LCOV_ZAHLOUBEN_PRO_M6_ROUBY_S_V_5_R)
        with Locations((-75.822124963, 25)):
            Circle(V_LCOV_ZAHLOUBEN_PRO_M6_ROUBY_S_V_5_R)
    extrude(amount=V_LCOV_ZAHLOUBEN_PRO_M6_ROUBY_S_V_4_2_DEPTH, mode=Mode.SUBTRACT)

    # M8 závit1
    with Locations(Plane(origin=(0, 70, 0), x_dir=(1, 0, 0), z_dir=(0, 1, 0))):
        with Locations((-23.791252921, 33)):
            CounterSinkHole(M8_Z_VIT1_D / 2, M8_Z_VIT1_CSINK_D / 2, depth=M8_Z_VIT1_DEPTH, counter_sink_angle=M8_Z_VIT1_CSINK_ANGLE)
            with Locations((0, 0, -(M8_Z_VIT1_DEPTH + M8_Z_VIT1_TIP / 2))):  # 118° drill point
                Cone(0, M8_Z_VIT1_D / 2, M8_Z_VIT1_TIP, mode=Mode.SUBTRACT)

    # Skica12 → Odebrat rotací1 (revolve, cut)
    with BuildSketch(Plane.XZ):
        Polygon((0, 61), (29, 61), (29, 51), (31, 51), (31, -51), (29, -51), (29, -61), (0, -61), align=None)
    revolve(axis=Axis((0, 0, -71.132425853), (0, 0, 1)), mode=Mode.SUBTRACT)


solid = part.part
